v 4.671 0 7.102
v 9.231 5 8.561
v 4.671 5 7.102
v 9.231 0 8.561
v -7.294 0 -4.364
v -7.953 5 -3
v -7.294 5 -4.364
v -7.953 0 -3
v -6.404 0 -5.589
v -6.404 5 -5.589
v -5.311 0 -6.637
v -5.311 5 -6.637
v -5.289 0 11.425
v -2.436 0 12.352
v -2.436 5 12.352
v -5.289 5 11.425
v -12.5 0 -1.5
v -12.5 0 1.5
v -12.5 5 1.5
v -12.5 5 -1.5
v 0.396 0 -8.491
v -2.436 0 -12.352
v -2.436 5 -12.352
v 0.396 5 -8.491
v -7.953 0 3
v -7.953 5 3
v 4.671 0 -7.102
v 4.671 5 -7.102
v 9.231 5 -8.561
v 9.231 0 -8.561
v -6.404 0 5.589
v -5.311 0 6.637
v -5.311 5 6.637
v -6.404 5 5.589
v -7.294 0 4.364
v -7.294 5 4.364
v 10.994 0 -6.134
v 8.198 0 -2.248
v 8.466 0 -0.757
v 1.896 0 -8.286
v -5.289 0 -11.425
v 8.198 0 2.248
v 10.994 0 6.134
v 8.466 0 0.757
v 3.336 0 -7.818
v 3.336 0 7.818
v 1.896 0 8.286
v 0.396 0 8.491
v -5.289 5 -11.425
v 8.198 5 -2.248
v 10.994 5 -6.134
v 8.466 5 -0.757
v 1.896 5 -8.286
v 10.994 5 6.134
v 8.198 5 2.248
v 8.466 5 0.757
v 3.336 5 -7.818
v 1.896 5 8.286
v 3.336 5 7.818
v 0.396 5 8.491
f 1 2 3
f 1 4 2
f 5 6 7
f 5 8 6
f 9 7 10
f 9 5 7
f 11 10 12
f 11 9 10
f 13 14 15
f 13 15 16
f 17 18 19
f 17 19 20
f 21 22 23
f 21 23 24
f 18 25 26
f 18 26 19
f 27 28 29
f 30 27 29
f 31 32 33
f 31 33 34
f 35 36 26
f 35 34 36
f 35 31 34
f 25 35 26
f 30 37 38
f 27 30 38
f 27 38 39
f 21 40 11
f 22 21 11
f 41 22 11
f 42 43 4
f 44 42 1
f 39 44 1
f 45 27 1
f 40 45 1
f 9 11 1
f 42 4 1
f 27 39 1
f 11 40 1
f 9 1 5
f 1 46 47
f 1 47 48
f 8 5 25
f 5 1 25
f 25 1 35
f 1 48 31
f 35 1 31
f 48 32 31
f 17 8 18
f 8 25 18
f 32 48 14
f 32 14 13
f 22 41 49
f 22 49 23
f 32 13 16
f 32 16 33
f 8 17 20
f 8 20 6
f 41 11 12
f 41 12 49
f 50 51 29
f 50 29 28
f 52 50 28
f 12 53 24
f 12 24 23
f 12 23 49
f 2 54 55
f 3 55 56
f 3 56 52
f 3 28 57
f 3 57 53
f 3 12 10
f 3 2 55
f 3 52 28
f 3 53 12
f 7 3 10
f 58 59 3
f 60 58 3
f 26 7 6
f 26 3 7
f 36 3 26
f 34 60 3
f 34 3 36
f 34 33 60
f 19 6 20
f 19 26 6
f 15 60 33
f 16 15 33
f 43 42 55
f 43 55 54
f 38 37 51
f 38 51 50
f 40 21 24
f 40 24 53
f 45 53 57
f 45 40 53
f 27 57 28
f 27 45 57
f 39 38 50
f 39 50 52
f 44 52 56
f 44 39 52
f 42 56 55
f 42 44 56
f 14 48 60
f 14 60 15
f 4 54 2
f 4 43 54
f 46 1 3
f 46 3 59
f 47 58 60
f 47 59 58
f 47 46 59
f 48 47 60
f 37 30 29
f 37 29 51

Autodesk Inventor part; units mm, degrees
ref_plane "YZ Plane" through (0, 0, 0) normal (1, 0, 0) x (0, 1, 0)
ref_plane "XZ Plane" through (0, 0, 0) normal (0, 1, 0) x (-1, 0, 0)
ref_plane "XY Plane" through (0, 0, 0) normal (0, 0, 1) x (1, 0, 0)
sketch "Sketch1" plane through (0, 0, 0) normal (0, 1, 0) x (-1, 0, 0)
  circle A0 centre (0, 0) radius 8.5
  line L0 (7.953, 3) -> (12.5, 1.5)
  line L1 (12.5, 1.5) -> (12.5, -1.5)
  line L2 (12.5, -1.5) -> (7.953, -3)
  line L3 (5.2893, 11.4247) -> (5.3108, 6.6367)
  line L4 (-0.3956, 8.4908) -> (2.4361, 12.3517)
  line L5 (2.4361, 12.3517) -> (5.2893, 11.4247)
  line L6 (-9.231, 8.5608) -> (-4.6707, 7.1017)
  line L7 (-8.1975, 2.2476) -> (-10.9944, 6.1338)
  line L8 (-10.9944, 6.1338) -> (-9.231, 8.5608)
  line L9 (-10.9944, -6.1338) -> (-8.1975, -2.2476)
  line L10 (-4.6707, -7.1017) -> (-9.231, -8.5608)
  line L11 (-9.231, -8.5608) -> (-10.9944, -6.1338)
  line L12 (2.4361, -12.3517) -> (-0.3956, -8.4908)
  line L13 (5.3108, -6.6367) -> (5.2893, -11.4247)
  line L14 (5.2893, -11.4247) -> (2.4361, -12.3517)
  point P0 (-0.3956, -8.4908)
  dimension "d0" = 17
  dimension "d1" = 3
  dimension "d2" = 4
  dimension "d3" = 6
  dimension "d4" = 108.257
  dimension "d5" = 108.257
  dimension "d8" = 360
extrude "Extrusion1" add sketch "Sketch1" along normal blind 5
equation "\"d4\" = d5"
properties part number "AP-1-01-spur5tooth"
